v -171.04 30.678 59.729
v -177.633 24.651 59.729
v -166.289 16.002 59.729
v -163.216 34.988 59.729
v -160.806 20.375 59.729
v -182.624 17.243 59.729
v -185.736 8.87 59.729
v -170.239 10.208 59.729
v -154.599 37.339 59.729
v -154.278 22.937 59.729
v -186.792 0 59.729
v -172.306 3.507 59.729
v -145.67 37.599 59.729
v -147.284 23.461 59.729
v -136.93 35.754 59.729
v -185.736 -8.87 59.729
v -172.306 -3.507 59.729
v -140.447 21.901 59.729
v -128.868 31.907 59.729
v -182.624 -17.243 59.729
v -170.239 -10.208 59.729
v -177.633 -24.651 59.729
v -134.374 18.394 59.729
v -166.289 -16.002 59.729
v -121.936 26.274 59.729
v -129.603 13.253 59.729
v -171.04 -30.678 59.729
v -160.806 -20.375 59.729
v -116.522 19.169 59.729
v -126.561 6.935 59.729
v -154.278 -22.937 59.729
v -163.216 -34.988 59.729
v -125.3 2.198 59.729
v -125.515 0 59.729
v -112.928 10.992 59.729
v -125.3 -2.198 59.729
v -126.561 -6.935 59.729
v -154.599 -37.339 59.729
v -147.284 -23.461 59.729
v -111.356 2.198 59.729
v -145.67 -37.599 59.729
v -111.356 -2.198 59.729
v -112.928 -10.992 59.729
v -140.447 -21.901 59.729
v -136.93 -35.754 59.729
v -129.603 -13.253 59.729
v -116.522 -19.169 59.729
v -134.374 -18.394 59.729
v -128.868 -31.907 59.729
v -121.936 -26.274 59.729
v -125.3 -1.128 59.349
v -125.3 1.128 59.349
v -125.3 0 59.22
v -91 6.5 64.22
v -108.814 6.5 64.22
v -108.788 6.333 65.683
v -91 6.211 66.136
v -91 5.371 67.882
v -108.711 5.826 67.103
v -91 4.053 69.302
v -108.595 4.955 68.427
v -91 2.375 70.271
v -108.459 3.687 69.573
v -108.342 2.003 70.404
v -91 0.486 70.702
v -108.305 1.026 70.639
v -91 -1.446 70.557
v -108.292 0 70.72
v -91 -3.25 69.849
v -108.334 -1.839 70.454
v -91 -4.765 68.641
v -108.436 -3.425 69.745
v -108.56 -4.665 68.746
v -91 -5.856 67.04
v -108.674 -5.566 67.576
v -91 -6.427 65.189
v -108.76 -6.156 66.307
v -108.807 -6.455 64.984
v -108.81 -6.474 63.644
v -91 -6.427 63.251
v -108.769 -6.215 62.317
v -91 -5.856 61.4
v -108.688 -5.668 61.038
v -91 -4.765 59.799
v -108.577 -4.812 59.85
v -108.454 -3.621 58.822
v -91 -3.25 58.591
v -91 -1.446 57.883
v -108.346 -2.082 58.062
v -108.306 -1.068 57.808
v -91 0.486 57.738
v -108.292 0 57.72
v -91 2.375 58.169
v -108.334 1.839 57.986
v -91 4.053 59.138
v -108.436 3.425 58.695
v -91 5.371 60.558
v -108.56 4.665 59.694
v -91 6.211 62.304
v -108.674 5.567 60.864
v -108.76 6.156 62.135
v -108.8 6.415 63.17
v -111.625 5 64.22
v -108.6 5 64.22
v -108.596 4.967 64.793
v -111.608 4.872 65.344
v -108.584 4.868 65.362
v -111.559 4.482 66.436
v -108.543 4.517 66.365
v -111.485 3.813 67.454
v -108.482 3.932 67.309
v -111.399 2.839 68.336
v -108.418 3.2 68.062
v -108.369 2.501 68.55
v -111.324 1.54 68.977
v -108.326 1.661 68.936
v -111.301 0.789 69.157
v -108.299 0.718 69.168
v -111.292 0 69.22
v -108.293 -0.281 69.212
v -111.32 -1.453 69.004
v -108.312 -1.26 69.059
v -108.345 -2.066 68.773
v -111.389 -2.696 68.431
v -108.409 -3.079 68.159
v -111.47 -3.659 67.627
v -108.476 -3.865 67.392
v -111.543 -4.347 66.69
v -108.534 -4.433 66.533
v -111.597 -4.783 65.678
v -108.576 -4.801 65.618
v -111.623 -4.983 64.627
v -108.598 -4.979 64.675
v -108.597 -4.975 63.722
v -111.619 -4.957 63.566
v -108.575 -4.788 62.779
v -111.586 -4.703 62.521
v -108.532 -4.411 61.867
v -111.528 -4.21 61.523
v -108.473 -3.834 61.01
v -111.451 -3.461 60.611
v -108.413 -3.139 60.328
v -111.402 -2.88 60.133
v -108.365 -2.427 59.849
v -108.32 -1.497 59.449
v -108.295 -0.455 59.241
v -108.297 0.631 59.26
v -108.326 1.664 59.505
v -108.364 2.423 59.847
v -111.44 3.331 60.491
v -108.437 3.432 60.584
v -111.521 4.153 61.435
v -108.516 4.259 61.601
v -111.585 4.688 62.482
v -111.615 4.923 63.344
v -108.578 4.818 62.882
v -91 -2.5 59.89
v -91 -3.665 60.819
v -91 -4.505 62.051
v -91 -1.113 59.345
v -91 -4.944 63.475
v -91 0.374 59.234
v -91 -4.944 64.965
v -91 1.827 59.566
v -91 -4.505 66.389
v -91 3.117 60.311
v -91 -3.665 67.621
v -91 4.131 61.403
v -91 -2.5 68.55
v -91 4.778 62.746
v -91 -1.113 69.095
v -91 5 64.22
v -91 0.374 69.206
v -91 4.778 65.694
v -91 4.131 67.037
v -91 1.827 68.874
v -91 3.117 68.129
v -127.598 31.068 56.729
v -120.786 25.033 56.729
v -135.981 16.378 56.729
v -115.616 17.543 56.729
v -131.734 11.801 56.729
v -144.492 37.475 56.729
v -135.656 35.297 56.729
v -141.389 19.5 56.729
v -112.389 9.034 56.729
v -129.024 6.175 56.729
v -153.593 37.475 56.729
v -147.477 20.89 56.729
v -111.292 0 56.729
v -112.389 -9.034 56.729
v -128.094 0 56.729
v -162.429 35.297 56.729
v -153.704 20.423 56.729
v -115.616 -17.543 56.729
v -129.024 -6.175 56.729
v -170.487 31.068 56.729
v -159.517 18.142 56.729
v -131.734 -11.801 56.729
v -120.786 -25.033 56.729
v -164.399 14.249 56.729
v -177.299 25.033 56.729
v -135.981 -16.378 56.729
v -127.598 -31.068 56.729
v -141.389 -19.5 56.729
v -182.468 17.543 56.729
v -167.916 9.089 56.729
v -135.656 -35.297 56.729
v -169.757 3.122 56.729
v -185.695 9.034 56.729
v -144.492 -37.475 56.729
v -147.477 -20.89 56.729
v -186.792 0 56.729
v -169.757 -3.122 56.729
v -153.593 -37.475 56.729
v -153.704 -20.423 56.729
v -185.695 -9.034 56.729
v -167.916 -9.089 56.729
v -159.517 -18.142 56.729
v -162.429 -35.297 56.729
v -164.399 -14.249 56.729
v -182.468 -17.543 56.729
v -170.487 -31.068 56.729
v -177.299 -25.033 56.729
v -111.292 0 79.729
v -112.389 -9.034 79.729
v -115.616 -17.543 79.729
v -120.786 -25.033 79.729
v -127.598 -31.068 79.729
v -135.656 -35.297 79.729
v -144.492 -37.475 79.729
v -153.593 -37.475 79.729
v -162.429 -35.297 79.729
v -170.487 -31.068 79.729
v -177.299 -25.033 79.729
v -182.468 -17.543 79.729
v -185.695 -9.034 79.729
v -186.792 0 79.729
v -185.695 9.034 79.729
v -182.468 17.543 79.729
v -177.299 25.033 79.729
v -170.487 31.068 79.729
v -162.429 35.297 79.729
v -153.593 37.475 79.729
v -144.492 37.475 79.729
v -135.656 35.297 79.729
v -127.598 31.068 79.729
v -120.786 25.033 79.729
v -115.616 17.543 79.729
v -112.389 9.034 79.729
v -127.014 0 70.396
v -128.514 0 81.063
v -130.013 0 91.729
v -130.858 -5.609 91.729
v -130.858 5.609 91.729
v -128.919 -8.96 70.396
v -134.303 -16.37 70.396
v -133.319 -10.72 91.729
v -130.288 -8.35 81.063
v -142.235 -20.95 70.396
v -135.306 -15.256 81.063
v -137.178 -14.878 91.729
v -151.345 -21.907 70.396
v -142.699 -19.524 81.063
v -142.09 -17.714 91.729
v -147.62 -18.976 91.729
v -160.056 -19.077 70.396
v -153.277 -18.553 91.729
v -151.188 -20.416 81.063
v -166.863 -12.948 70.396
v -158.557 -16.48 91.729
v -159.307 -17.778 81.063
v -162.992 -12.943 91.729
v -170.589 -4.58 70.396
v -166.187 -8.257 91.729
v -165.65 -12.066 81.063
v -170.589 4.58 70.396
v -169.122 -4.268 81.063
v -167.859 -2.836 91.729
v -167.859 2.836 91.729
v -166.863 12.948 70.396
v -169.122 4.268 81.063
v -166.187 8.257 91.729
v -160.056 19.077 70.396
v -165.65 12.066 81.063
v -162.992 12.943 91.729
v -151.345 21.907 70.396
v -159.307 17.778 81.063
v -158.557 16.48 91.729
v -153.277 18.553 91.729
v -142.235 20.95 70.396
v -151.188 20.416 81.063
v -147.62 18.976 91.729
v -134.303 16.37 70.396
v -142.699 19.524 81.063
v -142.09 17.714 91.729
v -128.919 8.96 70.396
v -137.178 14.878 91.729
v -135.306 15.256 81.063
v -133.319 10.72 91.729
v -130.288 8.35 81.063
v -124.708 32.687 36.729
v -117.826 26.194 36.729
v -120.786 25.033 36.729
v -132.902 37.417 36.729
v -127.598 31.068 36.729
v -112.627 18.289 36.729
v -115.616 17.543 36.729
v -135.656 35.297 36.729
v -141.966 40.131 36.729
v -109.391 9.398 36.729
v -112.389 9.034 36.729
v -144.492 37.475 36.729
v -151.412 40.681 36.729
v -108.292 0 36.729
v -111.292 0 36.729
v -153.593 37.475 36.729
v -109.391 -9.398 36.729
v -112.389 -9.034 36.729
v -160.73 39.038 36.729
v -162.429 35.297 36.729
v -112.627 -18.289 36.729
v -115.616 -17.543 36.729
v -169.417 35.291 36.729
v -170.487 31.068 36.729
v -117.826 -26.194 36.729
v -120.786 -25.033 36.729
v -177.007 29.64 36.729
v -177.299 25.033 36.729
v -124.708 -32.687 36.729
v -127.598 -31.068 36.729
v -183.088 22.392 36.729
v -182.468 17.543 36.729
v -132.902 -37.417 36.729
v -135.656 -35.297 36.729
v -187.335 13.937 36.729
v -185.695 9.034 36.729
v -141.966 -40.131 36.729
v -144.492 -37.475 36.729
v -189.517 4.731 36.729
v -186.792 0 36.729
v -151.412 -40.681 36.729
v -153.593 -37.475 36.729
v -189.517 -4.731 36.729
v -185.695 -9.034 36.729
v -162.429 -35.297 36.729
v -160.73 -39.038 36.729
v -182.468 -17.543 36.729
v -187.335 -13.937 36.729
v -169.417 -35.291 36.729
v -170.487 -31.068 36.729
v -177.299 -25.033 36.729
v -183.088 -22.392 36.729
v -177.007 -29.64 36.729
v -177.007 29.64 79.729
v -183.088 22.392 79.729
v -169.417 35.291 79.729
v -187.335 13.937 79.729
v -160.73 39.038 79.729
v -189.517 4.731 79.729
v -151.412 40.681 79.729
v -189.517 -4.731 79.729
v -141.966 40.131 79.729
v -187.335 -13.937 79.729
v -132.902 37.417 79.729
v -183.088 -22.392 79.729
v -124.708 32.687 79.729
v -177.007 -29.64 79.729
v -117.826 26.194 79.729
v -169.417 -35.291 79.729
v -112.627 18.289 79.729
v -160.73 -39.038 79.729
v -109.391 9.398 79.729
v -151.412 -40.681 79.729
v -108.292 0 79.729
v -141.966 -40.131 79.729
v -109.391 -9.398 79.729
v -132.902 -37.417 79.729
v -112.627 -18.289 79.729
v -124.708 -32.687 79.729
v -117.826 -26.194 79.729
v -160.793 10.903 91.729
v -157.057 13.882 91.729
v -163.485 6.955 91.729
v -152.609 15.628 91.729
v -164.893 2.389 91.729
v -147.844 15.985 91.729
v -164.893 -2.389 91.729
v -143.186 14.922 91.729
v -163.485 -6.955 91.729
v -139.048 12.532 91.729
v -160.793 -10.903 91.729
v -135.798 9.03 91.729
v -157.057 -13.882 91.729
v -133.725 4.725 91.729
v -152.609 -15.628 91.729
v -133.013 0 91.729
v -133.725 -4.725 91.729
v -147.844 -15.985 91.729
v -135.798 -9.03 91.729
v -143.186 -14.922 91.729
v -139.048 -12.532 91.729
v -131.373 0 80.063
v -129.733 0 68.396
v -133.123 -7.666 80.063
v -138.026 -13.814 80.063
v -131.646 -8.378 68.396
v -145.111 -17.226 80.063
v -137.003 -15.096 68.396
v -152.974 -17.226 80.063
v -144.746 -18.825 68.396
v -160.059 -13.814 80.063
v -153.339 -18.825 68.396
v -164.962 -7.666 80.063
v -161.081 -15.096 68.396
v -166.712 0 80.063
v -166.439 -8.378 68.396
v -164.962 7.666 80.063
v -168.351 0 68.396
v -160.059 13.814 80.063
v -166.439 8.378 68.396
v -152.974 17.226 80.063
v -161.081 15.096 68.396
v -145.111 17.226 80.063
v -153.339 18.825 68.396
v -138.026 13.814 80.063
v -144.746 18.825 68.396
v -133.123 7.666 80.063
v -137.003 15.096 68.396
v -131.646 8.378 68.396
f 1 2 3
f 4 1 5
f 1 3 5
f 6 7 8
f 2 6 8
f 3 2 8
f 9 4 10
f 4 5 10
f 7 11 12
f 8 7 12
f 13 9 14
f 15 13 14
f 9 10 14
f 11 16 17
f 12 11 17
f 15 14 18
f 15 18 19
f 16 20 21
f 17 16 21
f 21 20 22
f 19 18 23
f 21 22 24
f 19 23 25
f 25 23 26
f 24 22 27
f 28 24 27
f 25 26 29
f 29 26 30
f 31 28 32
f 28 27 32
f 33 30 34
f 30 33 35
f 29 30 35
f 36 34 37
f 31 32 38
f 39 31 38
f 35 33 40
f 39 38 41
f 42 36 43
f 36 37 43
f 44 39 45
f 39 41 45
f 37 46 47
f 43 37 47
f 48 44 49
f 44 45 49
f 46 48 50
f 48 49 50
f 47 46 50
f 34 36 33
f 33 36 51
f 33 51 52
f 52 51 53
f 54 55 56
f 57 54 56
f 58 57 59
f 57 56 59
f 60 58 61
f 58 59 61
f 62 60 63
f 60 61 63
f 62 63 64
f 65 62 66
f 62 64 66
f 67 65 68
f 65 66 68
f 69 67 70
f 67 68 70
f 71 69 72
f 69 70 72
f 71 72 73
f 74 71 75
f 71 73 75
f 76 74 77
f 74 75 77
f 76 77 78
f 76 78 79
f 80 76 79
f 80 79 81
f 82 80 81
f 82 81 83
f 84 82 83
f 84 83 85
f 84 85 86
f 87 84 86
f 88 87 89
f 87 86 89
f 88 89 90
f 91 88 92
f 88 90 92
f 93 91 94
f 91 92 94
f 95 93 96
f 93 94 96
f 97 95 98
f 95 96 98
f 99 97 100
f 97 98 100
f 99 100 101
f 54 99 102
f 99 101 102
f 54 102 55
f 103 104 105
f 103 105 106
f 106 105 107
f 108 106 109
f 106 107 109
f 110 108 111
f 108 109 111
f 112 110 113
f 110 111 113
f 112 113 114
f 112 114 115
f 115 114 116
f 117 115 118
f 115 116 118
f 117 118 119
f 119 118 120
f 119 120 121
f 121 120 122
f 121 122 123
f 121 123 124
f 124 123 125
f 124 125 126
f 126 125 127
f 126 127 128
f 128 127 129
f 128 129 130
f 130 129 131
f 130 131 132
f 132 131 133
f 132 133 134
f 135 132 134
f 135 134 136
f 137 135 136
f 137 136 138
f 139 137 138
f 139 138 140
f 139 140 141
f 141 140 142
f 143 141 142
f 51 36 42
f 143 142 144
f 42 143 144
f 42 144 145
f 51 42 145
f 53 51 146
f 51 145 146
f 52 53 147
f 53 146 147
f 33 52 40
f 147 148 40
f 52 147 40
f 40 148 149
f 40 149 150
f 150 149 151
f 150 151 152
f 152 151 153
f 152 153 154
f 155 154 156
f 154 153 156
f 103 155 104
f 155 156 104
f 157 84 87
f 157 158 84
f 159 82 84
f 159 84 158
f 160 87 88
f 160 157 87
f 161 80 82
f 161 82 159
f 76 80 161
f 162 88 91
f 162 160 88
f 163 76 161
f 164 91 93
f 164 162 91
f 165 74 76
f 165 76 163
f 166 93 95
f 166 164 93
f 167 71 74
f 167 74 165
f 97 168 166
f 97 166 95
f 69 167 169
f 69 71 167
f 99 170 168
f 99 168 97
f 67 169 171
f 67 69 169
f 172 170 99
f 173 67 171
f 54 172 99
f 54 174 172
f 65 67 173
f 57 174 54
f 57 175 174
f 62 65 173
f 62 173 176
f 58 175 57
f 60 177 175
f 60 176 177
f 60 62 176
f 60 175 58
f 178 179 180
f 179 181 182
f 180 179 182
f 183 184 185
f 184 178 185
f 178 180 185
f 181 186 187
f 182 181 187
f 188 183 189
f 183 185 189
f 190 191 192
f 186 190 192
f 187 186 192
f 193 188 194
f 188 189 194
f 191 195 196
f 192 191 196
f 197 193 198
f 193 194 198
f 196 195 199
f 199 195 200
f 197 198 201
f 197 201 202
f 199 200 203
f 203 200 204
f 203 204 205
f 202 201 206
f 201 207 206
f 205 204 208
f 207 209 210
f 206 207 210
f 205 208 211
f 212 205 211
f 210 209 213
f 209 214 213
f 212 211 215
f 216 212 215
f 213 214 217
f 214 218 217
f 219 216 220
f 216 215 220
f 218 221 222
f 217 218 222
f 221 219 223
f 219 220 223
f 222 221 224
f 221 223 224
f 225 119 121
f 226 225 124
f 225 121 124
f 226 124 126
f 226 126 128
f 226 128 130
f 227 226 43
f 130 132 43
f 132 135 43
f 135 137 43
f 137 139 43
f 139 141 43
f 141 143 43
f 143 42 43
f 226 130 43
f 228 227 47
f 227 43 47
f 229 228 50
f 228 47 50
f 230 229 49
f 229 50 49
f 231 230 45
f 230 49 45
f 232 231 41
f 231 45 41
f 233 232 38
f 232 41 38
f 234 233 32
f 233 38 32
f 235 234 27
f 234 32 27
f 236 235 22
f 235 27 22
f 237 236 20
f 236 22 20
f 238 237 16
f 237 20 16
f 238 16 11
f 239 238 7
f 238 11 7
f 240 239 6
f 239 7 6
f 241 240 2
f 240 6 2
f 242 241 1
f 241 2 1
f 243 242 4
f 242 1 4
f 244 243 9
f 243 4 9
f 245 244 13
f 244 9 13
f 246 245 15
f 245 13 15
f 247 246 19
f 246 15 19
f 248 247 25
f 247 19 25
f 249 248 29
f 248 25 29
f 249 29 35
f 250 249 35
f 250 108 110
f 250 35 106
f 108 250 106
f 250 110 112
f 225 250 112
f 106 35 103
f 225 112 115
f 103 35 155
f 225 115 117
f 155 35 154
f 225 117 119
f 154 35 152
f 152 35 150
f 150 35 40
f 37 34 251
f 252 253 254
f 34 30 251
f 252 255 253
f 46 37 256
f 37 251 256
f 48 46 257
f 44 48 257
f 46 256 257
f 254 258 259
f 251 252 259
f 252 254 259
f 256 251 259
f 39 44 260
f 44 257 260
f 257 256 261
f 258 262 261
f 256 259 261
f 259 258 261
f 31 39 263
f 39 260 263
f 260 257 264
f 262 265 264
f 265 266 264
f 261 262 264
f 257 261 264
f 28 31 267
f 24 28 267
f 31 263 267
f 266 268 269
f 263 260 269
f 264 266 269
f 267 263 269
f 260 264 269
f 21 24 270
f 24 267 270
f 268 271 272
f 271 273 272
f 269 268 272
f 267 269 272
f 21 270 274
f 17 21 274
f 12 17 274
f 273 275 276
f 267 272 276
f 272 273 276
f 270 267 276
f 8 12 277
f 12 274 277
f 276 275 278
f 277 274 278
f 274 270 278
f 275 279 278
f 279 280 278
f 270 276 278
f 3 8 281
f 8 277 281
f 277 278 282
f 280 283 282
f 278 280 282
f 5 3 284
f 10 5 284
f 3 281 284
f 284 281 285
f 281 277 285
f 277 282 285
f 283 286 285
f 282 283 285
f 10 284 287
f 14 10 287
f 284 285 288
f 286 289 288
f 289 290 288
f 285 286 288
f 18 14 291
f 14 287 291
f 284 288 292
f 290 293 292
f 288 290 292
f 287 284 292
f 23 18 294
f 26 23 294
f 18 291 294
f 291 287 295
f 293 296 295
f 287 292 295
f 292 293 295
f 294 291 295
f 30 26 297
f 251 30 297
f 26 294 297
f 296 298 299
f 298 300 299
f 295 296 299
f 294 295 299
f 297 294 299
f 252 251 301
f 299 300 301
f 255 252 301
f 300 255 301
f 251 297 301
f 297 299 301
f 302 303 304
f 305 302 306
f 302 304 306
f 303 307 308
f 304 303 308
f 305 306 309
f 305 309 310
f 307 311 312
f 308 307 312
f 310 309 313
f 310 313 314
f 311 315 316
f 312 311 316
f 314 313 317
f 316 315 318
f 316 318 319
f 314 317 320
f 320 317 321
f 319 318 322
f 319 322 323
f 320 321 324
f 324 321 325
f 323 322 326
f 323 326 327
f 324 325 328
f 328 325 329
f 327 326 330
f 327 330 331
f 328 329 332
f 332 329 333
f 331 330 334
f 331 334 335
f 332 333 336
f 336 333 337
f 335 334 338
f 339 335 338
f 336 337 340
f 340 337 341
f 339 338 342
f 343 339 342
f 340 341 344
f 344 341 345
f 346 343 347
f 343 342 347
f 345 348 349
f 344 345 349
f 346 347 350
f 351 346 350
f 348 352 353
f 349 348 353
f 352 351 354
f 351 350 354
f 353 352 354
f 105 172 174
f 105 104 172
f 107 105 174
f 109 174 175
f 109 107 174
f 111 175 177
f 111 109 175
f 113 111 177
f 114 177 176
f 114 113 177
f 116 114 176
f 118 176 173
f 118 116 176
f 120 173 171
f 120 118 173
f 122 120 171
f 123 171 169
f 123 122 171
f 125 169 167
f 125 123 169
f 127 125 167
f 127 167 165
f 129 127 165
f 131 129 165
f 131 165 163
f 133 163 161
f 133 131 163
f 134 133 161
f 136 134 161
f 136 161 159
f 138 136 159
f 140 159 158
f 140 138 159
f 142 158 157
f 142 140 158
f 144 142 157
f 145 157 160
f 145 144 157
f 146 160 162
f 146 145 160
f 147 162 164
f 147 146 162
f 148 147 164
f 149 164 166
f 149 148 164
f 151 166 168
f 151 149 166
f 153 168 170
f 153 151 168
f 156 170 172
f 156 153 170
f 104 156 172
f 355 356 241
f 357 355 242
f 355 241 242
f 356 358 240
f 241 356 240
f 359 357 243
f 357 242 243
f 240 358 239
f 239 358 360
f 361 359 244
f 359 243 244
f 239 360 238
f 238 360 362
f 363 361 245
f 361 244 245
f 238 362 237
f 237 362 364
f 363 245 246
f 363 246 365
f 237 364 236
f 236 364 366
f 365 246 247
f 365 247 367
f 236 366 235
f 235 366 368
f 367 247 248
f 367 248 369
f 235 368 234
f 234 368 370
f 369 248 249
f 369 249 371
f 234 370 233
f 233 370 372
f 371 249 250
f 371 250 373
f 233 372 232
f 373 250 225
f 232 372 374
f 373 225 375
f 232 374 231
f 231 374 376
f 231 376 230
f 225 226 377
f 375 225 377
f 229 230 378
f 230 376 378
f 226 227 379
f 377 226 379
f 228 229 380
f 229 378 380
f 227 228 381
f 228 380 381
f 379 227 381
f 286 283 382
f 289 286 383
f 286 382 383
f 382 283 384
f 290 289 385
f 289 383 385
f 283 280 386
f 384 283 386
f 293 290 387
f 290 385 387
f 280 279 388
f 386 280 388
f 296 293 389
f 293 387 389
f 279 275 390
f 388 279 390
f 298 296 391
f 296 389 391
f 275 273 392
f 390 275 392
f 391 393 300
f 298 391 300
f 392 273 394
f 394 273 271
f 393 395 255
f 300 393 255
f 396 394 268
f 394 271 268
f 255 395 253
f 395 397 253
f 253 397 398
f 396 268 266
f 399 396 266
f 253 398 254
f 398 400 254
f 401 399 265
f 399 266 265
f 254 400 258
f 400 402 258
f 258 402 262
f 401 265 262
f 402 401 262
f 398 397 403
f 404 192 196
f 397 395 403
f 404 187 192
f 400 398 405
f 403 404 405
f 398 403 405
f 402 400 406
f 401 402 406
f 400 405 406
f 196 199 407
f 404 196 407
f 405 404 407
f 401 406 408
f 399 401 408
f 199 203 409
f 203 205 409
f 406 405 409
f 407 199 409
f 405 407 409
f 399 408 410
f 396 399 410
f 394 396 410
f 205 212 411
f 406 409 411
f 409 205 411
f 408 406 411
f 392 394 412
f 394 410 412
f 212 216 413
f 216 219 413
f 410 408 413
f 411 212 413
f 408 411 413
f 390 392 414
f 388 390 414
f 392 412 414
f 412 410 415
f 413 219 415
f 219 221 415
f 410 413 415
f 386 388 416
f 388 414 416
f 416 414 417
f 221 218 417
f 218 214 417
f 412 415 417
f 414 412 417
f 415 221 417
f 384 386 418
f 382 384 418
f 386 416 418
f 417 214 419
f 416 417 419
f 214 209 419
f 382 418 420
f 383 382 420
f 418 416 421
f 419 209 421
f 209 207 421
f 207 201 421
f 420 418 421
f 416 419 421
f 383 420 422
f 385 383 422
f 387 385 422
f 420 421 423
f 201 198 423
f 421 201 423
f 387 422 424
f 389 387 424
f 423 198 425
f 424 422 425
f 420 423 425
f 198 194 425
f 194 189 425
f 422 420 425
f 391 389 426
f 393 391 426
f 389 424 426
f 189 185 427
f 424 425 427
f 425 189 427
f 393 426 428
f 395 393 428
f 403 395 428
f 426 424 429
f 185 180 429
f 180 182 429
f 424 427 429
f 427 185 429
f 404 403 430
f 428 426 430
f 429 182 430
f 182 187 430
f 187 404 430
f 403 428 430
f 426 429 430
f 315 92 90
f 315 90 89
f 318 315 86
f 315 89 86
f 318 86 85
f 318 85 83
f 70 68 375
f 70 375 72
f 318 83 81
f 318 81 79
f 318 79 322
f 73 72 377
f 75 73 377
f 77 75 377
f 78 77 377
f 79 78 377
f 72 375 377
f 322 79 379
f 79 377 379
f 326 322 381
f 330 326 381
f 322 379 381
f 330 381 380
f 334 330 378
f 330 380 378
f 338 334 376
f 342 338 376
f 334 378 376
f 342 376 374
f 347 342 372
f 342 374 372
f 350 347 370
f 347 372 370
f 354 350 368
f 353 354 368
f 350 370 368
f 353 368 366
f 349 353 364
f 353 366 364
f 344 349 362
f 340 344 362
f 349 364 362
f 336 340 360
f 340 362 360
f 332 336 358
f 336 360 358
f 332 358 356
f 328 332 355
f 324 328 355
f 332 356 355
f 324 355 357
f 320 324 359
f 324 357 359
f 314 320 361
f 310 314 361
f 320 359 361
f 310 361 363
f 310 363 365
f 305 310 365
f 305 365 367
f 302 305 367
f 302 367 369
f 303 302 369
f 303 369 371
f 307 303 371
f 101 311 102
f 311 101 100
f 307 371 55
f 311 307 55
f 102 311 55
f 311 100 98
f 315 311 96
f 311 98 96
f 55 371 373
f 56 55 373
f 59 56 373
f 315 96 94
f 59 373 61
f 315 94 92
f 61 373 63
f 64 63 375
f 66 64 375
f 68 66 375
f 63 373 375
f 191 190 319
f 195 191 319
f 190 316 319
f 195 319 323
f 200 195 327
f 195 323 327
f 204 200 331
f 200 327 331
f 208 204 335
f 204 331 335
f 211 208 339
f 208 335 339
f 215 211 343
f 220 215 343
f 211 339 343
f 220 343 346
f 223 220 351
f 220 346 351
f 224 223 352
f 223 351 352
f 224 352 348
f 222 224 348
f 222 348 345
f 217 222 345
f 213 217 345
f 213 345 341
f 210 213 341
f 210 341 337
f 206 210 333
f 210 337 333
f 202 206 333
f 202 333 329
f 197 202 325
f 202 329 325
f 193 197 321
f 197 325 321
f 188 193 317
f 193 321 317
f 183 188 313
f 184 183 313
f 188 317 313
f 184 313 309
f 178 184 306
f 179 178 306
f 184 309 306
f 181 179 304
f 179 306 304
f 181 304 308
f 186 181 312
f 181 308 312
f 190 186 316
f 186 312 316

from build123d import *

# Parameters (mm, degrees)
F3_R     = 6.5
F3_R_2   = 5
F4_DEPTH = 20
F5_DEPTH = 14.3


with BuildPart() as f1:
    # F0 (on Front) → F1 (revolve)
    with BuildSketch(Plane.XZ):
        Polygon((-130.0127011951, 91.7292905117), (-133.0127011951, 91.7292905117), (-128.0937719805, 56.7292905117), (-111.2923327753, 56.7292905117), (-111.2923327753, 36.7292905117), (-108.2923327753, 36.7292905117), (-108.2923327753, 79.7292905117), (-111.2923327753, 79.7292905117), (-111.2923327753, 59.7292905117), (-125.5153944847, 59.7292905117), align=None)
    revolve(axis=Axis((-149.0423327753, 0, 54.1304184761), (0, 0, -1)))

    # F3 (on offset) → F4 (join)
    with BuildSketch(Plane.YZ.offset(-111)):
        with Locations((0, 64.2200395022)):
            Circle(F3_R)
        with Locations((0, 64.2200395022)):
            Circle(F3_R_2, mode=Mode.SUBTRACT)
    extrude(amount=F4_DEPTH)

    # F3 (on offset) → F5 (cut, symmetric)
    with BuildSketch(Plane.YZ.offset(-111)):
        with Locations((0, 64.2200395022)):
            Circle(F3_R_2)
    extrude(amount=F5_DEPTH, both=True, mode=Mode.SUBTRACT)


solid = f1.part
